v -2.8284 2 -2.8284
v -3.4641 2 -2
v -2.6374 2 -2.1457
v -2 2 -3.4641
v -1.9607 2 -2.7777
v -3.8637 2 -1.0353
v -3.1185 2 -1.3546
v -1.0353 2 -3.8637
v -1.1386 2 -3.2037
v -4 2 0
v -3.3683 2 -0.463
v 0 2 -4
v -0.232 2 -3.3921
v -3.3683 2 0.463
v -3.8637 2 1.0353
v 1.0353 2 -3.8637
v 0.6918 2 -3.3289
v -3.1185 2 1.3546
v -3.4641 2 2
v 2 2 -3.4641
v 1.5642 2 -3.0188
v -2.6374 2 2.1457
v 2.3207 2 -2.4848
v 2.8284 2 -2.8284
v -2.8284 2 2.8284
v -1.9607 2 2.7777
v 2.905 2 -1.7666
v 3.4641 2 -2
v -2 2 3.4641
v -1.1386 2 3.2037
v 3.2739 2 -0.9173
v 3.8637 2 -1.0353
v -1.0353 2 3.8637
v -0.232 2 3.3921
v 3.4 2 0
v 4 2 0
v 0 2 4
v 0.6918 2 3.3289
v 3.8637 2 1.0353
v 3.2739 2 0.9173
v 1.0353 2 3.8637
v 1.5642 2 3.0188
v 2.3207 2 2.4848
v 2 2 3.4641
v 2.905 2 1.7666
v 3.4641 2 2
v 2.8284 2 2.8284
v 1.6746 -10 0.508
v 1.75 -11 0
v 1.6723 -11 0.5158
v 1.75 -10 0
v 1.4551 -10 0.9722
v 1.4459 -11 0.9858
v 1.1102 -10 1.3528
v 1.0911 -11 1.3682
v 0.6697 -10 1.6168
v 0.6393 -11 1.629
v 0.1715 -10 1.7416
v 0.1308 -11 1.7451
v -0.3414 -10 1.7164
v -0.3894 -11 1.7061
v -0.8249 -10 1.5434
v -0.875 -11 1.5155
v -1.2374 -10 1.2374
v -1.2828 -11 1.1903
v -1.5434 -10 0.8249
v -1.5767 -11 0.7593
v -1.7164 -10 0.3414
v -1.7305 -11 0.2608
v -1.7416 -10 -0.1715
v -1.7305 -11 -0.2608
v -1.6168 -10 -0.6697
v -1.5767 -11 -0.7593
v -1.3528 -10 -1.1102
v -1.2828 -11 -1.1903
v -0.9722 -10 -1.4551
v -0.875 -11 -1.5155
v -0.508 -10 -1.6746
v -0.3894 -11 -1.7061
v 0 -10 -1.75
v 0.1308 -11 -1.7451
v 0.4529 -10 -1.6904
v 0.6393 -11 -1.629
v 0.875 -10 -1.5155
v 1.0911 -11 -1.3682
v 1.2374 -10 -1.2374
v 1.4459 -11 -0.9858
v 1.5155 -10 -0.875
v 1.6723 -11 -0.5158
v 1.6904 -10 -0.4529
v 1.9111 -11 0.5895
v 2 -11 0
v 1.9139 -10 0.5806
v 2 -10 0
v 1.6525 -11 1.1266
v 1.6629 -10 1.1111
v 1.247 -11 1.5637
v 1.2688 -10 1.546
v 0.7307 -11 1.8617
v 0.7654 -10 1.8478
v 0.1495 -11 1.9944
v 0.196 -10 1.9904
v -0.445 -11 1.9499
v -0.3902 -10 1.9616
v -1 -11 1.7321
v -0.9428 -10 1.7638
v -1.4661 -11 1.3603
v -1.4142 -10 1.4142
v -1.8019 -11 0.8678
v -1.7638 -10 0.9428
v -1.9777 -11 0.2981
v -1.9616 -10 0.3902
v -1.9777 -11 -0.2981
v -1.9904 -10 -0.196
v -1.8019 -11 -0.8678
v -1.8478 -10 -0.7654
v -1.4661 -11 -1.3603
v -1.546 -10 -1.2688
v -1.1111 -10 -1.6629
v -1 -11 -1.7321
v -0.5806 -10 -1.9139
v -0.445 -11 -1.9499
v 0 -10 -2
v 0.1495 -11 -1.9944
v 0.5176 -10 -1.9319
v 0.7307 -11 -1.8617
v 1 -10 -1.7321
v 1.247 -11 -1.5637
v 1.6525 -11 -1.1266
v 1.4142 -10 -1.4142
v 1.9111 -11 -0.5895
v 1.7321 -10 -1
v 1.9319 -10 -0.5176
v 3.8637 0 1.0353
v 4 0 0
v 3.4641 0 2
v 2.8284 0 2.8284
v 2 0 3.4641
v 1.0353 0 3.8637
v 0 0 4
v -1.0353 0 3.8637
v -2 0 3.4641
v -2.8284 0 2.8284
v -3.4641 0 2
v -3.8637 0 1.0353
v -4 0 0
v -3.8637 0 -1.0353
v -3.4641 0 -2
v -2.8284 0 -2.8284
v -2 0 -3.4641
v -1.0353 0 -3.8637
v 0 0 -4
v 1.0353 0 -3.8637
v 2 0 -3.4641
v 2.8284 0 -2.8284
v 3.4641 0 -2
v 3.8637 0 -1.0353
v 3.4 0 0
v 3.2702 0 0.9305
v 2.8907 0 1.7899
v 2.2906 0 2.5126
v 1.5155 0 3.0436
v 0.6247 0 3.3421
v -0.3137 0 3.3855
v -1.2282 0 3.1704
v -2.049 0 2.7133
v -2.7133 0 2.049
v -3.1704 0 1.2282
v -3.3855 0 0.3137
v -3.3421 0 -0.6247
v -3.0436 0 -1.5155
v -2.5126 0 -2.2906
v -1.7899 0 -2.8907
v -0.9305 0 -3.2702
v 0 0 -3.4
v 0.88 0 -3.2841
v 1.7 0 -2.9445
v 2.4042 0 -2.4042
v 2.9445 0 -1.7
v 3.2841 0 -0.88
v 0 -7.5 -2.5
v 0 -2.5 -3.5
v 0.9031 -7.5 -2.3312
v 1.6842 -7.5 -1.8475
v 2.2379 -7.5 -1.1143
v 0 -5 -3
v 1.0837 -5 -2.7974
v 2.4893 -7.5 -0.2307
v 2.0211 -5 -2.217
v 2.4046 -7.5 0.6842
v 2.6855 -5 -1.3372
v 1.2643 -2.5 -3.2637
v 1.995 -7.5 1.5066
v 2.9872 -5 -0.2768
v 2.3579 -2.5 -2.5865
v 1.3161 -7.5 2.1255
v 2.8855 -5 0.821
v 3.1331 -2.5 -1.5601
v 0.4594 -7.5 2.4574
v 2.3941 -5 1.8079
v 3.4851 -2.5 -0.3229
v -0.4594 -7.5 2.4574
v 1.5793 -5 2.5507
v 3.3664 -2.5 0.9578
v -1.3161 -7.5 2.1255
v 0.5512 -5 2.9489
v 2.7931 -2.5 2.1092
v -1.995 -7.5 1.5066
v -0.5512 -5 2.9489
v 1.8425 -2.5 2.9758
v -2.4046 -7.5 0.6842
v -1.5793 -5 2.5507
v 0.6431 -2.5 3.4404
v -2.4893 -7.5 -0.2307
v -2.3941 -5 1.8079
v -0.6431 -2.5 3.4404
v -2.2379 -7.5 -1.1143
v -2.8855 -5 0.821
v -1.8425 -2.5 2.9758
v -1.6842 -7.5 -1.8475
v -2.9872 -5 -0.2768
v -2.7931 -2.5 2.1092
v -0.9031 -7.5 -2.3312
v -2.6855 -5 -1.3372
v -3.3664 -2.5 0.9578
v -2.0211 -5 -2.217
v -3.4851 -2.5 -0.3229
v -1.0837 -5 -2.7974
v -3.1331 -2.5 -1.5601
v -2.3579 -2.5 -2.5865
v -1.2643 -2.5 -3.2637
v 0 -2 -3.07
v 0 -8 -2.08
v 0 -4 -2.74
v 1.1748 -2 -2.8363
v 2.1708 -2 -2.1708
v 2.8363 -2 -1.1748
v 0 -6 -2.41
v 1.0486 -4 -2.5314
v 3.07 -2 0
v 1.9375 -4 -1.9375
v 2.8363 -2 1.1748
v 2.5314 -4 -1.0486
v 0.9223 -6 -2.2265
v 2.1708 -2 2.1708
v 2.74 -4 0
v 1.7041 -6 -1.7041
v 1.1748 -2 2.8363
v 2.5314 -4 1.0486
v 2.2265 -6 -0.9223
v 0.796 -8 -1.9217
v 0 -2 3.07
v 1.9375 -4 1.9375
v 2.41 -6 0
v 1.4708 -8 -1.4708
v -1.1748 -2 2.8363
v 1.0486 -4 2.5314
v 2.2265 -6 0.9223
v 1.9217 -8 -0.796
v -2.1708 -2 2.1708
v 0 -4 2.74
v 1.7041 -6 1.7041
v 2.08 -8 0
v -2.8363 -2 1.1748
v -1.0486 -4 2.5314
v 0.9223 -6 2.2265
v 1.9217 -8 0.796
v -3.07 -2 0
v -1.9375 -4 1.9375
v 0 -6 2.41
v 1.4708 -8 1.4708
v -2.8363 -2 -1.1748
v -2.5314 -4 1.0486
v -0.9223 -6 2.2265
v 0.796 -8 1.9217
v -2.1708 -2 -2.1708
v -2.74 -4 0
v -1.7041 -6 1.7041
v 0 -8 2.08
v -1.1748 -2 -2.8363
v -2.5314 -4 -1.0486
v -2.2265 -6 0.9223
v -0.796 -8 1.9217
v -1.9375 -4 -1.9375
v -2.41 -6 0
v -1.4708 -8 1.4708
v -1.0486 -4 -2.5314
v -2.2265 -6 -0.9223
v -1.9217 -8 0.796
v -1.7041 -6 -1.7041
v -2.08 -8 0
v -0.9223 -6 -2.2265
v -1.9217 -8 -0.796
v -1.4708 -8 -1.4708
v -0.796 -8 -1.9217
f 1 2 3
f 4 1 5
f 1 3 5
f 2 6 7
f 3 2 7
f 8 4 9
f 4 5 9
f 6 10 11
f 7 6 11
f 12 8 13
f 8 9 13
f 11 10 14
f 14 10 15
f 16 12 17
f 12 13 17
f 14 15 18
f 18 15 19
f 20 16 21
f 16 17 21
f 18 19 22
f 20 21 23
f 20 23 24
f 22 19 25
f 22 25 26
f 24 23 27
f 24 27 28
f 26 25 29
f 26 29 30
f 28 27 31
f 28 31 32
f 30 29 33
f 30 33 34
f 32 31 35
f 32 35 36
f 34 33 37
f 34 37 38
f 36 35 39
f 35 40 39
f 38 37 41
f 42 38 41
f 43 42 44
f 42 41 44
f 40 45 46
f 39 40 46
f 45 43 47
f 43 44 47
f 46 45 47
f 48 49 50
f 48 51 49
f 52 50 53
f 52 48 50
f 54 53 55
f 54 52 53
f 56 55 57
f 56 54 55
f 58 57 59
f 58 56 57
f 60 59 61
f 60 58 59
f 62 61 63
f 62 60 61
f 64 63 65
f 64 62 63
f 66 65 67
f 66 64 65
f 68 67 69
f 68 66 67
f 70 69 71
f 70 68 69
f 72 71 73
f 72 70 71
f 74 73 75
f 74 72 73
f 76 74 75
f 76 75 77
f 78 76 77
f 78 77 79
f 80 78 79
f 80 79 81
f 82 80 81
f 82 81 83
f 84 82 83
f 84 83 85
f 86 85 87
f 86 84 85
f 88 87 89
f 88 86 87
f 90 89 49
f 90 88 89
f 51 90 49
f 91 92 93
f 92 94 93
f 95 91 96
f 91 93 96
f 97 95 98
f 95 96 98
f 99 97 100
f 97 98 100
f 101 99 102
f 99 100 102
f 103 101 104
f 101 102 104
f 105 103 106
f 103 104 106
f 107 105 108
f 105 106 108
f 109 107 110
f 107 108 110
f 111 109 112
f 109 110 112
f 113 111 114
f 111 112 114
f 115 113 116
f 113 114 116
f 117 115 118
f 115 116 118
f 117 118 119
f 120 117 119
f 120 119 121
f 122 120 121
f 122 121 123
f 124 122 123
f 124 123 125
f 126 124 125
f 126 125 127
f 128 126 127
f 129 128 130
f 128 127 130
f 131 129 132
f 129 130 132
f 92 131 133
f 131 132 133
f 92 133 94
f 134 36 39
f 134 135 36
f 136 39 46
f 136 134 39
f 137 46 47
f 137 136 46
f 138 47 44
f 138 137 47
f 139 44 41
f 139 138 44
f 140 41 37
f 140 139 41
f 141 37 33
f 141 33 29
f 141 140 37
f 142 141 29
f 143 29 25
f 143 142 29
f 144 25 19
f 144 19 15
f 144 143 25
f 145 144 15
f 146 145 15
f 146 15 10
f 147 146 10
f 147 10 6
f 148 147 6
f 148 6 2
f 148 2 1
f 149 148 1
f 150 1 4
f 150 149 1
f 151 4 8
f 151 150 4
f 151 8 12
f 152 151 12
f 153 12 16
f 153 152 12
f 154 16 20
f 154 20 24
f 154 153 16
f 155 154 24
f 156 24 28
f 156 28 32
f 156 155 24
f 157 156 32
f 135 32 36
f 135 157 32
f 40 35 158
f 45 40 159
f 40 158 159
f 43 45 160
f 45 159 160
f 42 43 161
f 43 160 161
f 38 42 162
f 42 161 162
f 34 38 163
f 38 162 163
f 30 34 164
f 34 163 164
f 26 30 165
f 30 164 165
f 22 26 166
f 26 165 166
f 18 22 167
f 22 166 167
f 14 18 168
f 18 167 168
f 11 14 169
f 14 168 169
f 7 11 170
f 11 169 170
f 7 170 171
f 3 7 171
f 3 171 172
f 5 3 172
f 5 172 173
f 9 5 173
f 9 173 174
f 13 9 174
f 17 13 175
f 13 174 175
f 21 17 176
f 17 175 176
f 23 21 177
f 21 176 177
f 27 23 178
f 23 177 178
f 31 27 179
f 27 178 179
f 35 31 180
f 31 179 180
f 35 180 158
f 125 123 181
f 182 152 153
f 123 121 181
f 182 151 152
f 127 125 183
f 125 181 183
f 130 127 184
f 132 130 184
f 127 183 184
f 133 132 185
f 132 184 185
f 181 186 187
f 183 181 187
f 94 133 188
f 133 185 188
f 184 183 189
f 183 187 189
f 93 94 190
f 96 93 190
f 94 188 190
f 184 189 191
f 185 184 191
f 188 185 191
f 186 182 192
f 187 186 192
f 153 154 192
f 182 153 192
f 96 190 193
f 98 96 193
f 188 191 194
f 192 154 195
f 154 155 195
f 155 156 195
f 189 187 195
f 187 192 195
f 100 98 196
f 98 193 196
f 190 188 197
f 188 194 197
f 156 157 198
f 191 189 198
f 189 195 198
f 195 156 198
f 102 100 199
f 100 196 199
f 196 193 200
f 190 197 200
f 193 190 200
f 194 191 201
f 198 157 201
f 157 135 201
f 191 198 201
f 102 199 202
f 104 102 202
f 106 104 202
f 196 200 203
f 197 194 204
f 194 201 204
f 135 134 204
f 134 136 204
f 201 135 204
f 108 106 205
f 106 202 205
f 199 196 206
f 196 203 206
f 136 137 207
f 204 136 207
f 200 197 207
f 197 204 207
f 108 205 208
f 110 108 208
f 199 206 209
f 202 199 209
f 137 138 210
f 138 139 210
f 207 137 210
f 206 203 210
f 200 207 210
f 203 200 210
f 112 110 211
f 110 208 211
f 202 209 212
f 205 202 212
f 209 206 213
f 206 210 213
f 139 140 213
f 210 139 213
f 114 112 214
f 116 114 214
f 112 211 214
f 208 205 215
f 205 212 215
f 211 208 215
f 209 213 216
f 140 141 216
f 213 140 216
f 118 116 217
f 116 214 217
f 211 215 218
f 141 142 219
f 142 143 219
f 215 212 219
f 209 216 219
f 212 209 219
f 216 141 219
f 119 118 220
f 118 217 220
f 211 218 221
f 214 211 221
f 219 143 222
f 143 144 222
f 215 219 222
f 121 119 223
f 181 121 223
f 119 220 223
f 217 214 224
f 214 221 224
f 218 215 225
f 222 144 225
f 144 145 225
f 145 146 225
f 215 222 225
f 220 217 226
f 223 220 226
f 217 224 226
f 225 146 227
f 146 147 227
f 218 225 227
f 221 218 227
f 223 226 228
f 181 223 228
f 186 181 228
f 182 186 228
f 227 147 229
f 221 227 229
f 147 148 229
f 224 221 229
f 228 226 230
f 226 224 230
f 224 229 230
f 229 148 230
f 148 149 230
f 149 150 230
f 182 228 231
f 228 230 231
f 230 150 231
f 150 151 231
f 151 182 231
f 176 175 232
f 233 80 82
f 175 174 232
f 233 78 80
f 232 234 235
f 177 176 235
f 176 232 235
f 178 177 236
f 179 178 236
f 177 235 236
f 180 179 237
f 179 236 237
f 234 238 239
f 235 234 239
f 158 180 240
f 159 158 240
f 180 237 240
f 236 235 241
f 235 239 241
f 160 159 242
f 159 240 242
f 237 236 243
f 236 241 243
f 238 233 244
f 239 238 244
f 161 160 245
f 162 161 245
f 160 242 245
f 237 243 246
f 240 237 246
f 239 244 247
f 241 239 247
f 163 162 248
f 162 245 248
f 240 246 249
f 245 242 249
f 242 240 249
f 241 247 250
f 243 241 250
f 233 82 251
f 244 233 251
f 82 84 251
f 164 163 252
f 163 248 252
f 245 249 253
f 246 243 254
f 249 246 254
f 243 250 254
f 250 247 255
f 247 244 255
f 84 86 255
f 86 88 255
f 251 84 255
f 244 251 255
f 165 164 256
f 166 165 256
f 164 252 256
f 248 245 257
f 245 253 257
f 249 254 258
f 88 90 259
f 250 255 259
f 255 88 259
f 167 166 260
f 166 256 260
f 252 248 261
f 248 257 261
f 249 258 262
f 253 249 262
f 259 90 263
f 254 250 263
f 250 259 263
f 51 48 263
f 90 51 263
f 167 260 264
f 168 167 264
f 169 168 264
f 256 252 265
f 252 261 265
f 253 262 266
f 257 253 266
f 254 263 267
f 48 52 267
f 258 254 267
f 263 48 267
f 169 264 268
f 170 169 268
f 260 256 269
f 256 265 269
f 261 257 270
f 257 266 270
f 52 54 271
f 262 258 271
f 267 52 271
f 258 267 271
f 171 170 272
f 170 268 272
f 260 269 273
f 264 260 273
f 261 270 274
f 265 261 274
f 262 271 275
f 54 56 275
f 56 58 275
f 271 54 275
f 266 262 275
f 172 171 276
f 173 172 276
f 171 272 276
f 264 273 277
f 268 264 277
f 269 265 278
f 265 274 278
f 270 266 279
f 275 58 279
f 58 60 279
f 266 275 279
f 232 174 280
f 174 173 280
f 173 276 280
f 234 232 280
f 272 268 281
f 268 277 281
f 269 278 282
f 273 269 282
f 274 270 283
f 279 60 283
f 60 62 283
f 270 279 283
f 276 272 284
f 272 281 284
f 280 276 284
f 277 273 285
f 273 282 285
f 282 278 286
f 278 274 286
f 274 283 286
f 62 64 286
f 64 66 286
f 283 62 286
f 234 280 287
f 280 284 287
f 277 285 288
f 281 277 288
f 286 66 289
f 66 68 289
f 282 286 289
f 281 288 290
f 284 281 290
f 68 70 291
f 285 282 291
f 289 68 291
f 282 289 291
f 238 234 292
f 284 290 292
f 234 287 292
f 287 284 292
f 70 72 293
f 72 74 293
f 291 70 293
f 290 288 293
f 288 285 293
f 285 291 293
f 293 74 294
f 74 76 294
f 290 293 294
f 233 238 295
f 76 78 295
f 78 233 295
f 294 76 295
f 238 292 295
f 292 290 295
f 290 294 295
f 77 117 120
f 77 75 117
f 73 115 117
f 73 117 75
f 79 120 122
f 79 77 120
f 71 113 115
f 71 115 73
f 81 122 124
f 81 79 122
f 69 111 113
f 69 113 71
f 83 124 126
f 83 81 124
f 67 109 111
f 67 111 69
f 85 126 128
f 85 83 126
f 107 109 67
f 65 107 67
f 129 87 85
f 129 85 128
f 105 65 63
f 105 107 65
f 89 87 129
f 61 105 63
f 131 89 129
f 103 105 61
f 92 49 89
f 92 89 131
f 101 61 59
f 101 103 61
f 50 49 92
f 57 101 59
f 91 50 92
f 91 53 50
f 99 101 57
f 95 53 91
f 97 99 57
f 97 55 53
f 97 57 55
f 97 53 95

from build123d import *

# Parameters (mm, degrees)
F2_R      = 2
F2_R_2    = 1.75
F3_DEPTH  = 2
F1_R      = 4
F1_R_2    = 3.4
F4_DEPTH  = 2
F7_DEPTH  = 1.9
F8_DEPTH  = 1.9
F9_DEPTH  = 0.9
F10_DEPTH = 1.9


with BuildPart() as f3:
    # F2 (on offset) → F3 (new body)
    with BuildSketch(Plane.XZ.offset(10)):
        Circle(F2_R)
        Circle(F2_R_2, mode=Mode.SUBTRACT)
    extrude(amount=F3_DEPTH)



with BuildPart() as f4:
    # F1 (on Front) → F4 (new body)
    with BuildSketch(Plane.XZ):
        Circle(F1_R)
        Circle(F1_R_2, mode=Mode.SUBTRACT)
    extrude(amount=-F4_DEPTH)


with BuildPart() as f3_1:
    add(f3.part)

    add(f4.part)  # F6 merges F4
    # F5 (on Right) → F6 (revolve)
    with BuildSketch(Plane.YZ):
        Polygon((-10, -2), (0, -4), (0, -3.4), (-10, -1.75), align=None)
    revolve(axis=Axis((0, -5, 0), (0, -1, 0)))

    # F7 (cut): a face of the model
    f7_faces = [f3_1.faces().sort_by_distance(p)[0] for p in [
        (-1.9434314575, -12, 0),
    ]]
    extrude(f7_faces, amount=-F7_DEPTH, mode=Mode.SUBTRACT)

    # F8 (cut): a face of the model
    f8_faces = [f3_1.faces().sort_by_distance(p)[0] for p in [
        (-3.886862915, 2, 0),
    ]]
    extrude(f8_faces, amount=-F8_DEPTH, mode=Mode.SUBTRACT)

    # F9 (add): a face of the model
    f9_faces = [f3_1.faces().sort_by_distance(p)[0] for p in [
        (-1.9434314575, -10.1, 0),
    ]]
    extrude(f9_faces, amount=F9_DEPTH)

    # F10 (add): a face of the model
    f10_faces = [f3_1.faces().sort_by_distance(p)[0] for p in [
        (-3.886862915, 0.1, 0),
    ]]
    extrude(f10_faces, amount=F10_DEPTH)


solid = f3_1.part
